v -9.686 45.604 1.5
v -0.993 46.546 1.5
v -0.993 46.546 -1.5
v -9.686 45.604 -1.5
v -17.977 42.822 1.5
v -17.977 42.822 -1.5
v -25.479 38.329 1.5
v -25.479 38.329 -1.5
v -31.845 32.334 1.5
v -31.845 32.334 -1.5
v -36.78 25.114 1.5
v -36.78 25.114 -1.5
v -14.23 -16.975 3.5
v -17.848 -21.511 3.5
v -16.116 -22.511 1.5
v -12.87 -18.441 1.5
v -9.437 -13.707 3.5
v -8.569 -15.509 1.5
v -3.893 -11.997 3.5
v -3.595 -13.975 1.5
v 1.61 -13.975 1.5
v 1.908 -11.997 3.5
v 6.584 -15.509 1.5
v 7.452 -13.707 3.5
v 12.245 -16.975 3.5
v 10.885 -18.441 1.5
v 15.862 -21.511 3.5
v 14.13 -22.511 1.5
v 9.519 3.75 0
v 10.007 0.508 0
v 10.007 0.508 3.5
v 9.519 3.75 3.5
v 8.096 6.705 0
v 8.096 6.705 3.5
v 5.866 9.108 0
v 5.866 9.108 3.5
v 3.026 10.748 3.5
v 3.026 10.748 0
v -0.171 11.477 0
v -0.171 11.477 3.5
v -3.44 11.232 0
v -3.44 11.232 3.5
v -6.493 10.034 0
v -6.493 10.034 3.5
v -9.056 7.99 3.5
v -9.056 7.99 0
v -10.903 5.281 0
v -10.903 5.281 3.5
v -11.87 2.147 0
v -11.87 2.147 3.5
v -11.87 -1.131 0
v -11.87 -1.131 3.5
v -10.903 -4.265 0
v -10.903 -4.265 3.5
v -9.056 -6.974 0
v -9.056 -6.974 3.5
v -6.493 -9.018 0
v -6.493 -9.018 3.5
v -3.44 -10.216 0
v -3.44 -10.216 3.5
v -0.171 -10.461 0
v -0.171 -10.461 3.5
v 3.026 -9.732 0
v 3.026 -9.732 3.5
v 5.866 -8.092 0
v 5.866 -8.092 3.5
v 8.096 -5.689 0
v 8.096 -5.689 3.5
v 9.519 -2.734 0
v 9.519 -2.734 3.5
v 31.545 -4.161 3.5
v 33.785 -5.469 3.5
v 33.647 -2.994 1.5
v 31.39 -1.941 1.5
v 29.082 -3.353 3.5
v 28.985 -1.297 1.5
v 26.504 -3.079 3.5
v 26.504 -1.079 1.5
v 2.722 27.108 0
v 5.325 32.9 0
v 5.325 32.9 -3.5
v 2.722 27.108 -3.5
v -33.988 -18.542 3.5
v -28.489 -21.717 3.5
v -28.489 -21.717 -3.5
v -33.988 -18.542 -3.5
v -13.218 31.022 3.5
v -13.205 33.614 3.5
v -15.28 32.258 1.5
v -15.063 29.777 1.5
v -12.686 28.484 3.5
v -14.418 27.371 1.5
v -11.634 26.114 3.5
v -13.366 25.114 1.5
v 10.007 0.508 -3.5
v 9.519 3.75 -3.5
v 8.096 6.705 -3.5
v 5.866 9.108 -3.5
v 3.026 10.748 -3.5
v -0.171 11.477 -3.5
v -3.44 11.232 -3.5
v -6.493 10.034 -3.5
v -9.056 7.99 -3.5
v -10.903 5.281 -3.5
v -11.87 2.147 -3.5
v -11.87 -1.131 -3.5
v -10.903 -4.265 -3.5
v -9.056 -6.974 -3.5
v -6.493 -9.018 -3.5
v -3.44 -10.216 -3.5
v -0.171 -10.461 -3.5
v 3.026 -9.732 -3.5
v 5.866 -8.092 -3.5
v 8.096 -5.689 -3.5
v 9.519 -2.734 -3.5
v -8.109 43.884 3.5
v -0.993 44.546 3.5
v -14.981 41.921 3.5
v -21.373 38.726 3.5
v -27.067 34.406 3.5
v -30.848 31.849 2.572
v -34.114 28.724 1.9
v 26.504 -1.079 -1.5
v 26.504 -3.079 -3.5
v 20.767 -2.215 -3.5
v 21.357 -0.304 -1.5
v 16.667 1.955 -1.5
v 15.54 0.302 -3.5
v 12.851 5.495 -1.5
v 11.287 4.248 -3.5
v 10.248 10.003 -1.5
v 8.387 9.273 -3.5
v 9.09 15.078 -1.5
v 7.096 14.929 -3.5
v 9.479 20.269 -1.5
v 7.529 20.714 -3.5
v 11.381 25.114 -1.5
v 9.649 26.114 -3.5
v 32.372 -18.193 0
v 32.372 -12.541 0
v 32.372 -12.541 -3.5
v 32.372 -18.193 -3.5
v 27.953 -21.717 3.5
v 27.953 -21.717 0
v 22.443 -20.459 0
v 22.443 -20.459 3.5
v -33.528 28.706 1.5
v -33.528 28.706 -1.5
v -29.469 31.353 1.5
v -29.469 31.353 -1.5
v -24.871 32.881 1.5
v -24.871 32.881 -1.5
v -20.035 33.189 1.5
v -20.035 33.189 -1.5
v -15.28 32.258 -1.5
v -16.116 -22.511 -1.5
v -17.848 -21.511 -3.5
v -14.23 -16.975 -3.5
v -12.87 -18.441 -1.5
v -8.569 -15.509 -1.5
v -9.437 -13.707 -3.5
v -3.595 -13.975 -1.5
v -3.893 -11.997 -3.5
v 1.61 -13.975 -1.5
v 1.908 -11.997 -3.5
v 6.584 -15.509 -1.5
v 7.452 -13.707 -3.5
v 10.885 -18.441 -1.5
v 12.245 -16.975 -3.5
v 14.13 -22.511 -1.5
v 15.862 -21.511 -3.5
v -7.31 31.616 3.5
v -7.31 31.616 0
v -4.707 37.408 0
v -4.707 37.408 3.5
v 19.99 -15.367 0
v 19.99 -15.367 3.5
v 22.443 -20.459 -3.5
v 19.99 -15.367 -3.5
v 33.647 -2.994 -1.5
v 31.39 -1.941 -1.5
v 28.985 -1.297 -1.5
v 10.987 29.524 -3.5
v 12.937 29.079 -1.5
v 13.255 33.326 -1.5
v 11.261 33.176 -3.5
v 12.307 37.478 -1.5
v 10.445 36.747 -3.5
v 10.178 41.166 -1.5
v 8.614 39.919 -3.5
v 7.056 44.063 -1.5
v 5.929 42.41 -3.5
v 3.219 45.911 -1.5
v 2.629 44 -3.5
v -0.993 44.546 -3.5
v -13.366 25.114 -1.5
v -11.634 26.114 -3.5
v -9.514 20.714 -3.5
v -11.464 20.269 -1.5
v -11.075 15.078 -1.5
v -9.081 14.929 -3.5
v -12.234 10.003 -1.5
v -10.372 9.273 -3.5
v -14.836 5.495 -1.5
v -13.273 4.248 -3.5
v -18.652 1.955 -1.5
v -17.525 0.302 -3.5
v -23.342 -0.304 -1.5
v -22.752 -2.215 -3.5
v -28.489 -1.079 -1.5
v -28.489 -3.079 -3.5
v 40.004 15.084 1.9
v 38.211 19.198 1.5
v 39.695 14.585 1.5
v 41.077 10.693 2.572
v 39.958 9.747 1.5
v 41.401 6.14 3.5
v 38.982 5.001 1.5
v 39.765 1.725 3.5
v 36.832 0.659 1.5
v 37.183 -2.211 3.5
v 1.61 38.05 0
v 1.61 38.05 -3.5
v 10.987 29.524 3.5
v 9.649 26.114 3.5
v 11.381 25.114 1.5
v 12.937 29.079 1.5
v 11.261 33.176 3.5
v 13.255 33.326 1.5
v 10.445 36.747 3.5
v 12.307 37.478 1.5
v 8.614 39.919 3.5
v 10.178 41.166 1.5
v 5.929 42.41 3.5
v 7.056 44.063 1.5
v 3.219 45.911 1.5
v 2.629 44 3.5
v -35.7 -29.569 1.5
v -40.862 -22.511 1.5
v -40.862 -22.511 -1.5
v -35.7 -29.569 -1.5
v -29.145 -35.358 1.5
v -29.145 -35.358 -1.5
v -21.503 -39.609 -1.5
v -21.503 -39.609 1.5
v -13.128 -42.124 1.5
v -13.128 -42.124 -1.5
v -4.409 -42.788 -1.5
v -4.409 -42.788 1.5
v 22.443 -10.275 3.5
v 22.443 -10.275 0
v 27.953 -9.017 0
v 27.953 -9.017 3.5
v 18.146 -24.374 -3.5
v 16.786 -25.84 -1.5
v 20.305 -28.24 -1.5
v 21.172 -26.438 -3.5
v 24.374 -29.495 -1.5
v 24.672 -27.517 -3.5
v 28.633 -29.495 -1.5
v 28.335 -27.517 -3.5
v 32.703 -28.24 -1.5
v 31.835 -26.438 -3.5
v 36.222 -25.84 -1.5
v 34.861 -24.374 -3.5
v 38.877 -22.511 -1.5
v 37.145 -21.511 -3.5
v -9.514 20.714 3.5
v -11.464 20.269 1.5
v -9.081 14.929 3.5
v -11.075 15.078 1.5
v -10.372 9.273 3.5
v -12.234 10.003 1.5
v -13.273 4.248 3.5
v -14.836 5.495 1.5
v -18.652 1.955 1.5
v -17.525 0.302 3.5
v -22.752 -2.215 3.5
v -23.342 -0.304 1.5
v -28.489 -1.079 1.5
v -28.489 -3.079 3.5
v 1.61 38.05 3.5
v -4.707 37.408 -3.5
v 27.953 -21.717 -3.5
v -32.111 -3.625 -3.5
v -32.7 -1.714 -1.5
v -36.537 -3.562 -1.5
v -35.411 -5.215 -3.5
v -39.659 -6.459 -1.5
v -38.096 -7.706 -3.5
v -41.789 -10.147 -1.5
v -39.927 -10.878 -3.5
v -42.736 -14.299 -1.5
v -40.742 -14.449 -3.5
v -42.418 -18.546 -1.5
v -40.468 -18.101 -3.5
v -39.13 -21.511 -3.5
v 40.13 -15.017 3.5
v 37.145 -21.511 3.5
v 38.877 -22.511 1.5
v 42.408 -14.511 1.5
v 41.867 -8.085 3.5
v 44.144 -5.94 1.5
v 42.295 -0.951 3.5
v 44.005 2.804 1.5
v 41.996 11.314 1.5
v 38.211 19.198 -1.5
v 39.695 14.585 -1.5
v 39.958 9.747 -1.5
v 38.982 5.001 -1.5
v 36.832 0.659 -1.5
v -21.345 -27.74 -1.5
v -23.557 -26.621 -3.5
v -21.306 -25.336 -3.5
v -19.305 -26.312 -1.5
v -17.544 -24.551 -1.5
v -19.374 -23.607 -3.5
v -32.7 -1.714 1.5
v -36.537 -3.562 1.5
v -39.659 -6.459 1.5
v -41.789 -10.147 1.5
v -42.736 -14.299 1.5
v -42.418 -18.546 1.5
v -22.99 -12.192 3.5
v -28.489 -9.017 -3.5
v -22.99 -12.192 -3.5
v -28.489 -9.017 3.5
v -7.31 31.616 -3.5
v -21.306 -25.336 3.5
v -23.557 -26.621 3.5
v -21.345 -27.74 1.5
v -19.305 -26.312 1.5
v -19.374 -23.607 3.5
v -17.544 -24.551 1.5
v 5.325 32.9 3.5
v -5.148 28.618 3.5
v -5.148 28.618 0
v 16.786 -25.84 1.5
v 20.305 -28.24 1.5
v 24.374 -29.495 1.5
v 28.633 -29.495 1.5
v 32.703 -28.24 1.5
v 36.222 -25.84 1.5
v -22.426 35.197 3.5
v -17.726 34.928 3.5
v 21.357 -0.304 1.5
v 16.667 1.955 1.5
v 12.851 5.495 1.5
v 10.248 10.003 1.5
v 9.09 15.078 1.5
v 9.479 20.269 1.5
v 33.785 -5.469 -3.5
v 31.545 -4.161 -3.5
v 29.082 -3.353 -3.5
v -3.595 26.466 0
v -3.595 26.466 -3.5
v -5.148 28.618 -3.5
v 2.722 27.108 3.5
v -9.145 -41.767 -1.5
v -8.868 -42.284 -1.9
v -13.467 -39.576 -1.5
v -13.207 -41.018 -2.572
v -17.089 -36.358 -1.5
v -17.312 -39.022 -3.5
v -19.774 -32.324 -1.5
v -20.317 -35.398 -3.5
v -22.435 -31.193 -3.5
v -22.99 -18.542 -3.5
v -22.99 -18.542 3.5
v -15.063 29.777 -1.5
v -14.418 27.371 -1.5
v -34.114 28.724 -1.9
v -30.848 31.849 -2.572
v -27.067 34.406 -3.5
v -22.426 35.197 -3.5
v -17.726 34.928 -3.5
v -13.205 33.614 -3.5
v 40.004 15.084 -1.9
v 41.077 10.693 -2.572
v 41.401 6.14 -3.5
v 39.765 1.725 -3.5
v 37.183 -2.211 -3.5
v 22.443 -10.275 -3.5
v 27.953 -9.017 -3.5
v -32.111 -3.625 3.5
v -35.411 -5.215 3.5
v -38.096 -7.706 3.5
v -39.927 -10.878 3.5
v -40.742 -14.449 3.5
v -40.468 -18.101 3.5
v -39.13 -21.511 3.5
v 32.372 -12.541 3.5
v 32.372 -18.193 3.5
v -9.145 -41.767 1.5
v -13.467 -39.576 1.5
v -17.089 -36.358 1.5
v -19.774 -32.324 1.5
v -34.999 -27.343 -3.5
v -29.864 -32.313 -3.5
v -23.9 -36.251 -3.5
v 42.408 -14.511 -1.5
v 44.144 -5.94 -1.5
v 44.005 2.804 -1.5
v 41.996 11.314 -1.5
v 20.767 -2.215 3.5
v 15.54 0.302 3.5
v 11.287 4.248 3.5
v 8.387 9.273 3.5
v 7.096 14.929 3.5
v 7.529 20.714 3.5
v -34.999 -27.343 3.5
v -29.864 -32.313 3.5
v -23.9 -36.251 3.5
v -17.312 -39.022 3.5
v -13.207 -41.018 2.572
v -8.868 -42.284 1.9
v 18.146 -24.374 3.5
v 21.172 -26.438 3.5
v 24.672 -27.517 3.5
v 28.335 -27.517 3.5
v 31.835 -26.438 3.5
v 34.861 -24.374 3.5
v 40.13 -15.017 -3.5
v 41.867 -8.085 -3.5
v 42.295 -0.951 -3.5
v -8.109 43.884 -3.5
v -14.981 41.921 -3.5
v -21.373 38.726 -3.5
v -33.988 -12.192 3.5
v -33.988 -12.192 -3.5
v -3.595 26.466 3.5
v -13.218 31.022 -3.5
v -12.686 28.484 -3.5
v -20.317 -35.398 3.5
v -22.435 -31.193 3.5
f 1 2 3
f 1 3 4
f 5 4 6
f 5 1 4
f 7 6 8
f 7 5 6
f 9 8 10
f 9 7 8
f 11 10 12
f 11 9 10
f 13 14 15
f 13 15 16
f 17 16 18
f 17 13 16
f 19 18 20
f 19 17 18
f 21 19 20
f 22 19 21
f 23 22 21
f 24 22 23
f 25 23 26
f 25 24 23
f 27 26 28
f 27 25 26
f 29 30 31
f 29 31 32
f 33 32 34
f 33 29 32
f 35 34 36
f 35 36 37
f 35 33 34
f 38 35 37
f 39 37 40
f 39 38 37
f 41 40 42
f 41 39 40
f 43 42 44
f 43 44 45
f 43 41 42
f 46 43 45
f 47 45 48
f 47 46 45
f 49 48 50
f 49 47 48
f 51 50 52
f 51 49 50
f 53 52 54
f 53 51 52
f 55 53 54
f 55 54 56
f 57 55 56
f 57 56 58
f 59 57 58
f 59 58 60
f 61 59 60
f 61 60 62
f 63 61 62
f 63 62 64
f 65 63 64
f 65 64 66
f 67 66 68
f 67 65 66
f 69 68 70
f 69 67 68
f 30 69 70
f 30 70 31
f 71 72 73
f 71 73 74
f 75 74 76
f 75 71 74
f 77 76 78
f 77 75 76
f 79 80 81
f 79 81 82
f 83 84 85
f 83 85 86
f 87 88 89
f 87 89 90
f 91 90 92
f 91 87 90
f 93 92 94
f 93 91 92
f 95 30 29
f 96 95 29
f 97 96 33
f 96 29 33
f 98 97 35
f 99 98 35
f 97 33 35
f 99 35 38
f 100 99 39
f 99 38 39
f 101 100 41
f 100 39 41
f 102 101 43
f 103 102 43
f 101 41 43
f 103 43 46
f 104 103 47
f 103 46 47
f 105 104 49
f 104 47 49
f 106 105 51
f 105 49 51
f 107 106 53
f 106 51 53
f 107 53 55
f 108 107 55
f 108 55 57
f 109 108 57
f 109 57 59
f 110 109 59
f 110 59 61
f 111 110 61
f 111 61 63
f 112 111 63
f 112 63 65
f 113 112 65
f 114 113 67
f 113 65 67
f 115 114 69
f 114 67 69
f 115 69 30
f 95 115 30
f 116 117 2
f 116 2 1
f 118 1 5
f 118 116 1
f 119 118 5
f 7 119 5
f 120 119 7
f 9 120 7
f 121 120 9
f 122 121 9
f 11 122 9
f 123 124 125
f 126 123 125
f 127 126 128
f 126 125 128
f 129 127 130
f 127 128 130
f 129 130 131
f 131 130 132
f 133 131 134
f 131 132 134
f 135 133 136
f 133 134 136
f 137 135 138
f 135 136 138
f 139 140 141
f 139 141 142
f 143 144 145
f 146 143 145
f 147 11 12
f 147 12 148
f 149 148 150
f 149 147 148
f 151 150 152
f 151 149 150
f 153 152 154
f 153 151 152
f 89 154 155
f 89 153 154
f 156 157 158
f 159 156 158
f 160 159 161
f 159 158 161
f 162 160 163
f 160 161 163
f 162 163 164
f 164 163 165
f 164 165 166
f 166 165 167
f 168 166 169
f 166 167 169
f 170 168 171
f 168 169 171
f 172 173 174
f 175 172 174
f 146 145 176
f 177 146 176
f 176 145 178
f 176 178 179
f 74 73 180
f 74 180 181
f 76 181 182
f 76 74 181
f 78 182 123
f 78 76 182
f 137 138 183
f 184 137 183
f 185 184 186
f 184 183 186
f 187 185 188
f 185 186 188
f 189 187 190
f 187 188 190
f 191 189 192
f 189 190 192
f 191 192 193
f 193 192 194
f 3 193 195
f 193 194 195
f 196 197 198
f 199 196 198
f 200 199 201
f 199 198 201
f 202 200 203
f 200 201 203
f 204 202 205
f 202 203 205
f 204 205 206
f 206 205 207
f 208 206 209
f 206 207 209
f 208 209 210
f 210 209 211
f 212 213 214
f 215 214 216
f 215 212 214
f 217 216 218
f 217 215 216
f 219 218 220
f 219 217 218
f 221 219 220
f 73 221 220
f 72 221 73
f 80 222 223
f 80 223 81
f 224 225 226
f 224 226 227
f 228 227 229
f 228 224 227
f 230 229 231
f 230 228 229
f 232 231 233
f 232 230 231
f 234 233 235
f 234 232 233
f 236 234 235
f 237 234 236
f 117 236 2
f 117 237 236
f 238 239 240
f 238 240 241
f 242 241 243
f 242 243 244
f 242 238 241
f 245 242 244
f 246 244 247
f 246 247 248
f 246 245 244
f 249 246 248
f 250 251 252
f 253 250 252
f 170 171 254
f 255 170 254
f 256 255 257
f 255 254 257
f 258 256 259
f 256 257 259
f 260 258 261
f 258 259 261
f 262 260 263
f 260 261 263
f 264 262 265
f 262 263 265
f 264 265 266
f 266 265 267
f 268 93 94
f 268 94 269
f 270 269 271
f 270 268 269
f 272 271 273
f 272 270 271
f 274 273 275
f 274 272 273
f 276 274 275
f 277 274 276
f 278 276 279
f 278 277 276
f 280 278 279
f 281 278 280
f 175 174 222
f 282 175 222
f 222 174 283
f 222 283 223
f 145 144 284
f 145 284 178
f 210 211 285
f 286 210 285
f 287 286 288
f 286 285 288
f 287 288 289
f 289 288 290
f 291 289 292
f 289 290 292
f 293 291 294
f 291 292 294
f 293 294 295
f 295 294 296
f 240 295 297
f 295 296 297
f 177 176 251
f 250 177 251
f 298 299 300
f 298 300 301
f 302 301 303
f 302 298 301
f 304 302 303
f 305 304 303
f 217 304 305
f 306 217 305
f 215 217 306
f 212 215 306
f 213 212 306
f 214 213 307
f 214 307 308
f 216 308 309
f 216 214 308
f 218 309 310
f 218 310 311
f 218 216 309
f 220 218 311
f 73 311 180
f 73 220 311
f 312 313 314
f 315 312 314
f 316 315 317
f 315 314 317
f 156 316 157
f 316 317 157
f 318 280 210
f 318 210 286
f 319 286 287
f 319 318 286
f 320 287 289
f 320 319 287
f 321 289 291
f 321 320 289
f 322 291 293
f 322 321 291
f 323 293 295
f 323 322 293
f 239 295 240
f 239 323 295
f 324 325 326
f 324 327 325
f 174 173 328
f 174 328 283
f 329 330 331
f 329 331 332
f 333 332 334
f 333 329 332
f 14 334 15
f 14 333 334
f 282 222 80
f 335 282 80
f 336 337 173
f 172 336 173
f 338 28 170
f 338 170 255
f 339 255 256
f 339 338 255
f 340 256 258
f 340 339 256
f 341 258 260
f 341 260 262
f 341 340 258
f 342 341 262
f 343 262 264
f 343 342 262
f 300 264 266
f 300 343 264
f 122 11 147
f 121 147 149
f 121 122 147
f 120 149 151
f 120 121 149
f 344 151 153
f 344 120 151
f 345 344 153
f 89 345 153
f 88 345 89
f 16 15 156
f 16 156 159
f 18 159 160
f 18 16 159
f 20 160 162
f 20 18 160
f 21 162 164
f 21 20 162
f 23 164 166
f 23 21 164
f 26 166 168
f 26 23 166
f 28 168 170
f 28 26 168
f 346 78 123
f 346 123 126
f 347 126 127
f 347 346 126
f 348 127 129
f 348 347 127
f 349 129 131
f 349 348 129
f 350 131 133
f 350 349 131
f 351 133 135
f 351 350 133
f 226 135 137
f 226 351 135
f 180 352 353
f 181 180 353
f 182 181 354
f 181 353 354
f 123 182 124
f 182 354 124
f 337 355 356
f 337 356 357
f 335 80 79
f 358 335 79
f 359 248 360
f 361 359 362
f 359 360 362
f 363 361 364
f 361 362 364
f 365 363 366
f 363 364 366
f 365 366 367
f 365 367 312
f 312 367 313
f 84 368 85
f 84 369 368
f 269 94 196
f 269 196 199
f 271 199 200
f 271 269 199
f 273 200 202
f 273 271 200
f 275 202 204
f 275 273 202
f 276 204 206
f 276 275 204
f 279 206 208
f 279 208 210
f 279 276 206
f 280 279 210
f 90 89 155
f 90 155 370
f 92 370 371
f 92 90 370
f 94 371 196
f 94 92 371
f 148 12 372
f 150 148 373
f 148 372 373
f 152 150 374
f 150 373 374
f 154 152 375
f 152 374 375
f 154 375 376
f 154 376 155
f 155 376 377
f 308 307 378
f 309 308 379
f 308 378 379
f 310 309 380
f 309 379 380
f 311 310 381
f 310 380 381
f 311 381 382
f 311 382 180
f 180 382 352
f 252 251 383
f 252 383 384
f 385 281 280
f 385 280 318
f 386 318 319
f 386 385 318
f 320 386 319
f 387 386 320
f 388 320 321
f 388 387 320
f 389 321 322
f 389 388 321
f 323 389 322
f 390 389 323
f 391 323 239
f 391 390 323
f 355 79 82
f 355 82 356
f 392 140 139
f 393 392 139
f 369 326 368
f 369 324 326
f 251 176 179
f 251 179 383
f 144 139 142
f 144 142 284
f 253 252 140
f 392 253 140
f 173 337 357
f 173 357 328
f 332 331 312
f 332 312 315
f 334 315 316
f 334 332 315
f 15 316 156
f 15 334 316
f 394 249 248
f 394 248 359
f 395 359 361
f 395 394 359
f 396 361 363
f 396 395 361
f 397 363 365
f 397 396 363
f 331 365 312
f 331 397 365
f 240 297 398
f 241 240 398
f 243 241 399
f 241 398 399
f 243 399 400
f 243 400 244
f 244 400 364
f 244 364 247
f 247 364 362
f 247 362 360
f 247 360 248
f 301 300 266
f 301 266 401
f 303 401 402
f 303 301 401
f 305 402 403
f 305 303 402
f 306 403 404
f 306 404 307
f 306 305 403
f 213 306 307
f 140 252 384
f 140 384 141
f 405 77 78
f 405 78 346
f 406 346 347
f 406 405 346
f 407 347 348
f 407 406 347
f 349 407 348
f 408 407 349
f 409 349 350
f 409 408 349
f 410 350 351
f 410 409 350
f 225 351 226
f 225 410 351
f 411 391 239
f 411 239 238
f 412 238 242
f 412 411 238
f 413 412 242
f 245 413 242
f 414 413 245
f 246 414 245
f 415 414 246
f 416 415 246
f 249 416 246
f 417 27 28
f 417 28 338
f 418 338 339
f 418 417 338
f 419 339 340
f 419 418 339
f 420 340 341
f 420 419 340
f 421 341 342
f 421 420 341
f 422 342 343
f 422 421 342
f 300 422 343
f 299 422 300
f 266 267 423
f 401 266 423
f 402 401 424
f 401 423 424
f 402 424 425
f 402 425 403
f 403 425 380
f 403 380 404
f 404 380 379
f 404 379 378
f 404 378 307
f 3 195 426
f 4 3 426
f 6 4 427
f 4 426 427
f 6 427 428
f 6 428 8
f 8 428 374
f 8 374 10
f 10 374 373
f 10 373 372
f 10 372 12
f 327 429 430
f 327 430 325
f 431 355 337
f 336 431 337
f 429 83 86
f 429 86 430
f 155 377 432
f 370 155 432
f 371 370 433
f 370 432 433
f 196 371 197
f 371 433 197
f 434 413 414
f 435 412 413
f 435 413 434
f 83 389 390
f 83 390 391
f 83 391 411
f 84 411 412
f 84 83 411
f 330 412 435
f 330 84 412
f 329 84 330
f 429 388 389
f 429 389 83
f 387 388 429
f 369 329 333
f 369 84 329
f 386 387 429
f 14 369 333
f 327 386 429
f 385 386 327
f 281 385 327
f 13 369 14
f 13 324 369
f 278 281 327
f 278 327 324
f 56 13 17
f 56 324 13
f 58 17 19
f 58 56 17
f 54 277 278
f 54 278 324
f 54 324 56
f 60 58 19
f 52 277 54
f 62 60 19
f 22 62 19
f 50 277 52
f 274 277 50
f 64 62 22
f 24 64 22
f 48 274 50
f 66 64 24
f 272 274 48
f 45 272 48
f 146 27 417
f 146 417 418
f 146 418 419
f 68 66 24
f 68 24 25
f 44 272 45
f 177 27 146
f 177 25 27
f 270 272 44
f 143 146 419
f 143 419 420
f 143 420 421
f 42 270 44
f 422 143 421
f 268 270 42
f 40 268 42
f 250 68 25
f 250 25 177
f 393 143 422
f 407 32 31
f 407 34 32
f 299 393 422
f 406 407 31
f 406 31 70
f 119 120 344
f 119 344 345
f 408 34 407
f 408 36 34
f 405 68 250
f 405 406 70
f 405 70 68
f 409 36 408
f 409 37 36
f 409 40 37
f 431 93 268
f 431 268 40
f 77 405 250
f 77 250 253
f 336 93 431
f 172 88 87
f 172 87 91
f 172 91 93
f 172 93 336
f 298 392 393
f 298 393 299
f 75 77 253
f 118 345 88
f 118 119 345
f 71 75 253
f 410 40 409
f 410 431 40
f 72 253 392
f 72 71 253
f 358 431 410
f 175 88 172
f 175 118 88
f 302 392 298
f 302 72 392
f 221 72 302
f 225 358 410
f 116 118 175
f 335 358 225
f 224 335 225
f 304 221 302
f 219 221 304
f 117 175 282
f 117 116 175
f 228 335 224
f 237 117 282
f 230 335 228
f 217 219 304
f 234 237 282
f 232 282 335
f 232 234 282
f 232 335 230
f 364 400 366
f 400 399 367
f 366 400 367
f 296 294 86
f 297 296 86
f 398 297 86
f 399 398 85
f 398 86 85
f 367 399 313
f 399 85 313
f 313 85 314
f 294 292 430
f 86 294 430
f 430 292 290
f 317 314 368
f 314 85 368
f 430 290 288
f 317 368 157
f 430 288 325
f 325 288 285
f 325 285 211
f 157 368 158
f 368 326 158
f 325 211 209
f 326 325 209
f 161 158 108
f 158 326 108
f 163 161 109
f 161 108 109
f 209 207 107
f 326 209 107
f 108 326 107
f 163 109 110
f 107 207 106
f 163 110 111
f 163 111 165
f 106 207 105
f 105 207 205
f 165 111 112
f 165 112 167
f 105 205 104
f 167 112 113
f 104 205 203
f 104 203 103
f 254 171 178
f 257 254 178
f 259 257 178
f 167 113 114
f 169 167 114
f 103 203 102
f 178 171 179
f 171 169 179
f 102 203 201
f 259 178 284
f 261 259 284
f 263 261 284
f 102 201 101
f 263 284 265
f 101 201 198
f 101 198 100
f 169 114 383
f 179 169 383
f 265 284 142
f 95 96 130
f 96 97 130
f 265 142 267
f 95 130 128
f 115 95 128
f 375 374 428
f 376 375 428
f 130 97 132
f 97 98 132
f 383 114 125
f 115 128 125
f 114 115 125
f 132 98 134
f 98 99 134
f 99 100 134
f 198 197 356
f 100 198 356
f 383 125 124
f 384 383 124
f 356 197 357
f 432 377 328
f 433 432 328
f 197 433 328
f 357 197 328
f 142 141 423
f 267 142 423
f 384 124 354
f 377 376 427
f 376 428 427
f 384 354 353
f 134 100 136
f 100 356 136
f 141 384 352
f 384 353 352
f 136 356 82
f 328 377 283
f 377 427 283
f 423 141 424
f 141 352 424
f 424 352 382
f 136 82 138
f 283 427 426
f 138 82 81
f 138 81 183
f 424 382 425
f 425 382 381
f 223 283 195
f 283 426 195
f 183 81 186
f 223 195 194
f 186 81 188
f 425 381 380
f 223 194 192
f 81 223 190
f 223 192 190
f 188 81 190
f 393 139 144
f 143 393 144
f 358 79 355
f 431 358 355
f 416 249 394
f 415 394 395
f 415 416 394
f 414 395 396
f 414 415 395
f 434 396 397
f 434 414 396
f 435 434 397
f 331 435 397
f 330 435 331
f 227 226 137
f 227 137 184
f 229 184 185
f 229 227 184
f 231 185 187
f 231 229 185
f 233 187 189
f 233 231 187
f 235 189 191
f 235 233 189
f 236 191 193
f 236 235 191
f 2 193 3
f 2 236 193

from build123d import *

# Parameters (mm, degrees)
F0_R          = 11
F1_DEPTH      = 3.5
F1_DEPTH_BACK = 3.5
F2_SIZE       = 2


# Not quite as in the source:
# - a feature names something its author has since deleted; it is built from what else it names


with BuildPart() as f1:
    # F0 (on Top) → F1 (new body, two sides)
    with BuildSketch(Plane.XY) as f1_sk:
        with BuildLine():
            ThreePointArc((-36.7798490863, 25.1142671396), (-27.219118588, 32.264950132), (-15.2801158302, 32.2580171396))
            ThreePointArc((-15.2801158302, 32.2580171396), (-14.7932810733, 28.5601400327), (-13.3659537868, 25.1142671396))
            ThreePointArc((-13.3659537868, 25.1142671396), (-13.3659537868, 7.6517671396), (-28.4889224003, -1.0794828604))
            ThreePointArc((-28.4889224003, -1.0794828604), (-40.8622603569, -8.2232328604), (-40.8622603569, -22.5107328604))
            ThreePointArc((-40.8622603569, -22.5107328604), (-25.4390445698, -37.6894940637), (-4.408636794, -42.7877609913))
            ThreePointArc((-4.408636794, -42.7877609913), (-15.3816751689, -38.0832669973), (-21.3451724003, -27.740320817))
            ThreePointArc((-21.3451724003, -27.740320817), (-18.3861342641, -25.4697709966), (-16.1155844438, -22.5107328604))
            ThreePointArc((-16.1155844438, -22.5107328604), (-0.9926158302, -13.7794828604), (14.1303527834, -22.5107328604))
            ThreePointArc((14.1303527834, -22.5107328604), (26.50369074, -29.6544828604), (38.8770286965, -22.5107328604))
            ThreePointArc((38.8770286965, -22.5107328604), (44.310613603, -1.5644555791), (38.2106383897, 19.1975452705))
            ThreePointArc((38.2106383897, 19.1975452705), (39.6229462664, 7.3423682841), (33.64744074, -2.9936449038))
            ThreePointArc((33.64744074, -2.9936449038), (30.2015678469, -1.5663176173), (26.50369074, -1.0794828604))
            ThreePointArc((26.50369074, -1.0794828604), (11.3807221264, 7.6517671396), (11.3807221264, 25.1142671396))
            ThreePointArc((11.3807221264, 25.1142671396), (11.3807221264, 39.4017671396), (-0.9926158302, 46.5455171396))
            ThreePointArc((-0.9926158302, 46.5455171396), (-21.8494165238, 40.7780010616), (-36.7798490863, 25.1142671396))
        make_face()
        Polygon((-28.4889224003, -21.7169828604), (-33.9881837144, -18.5419828604), (-33.9881837144, -12.1919828604), (-28.4889224003, -9.0169828604), (-22.9896610863, -12.1919828604), (-22.9896610863, -18.5419828604), align=None, mode=Mode.SUBTRACT)
        with Locations((-0.9926158302, 0.5080171396)):
            Circle(F0_R, mode=Mode.SUBTRACT)
        Polygon((27.9530368024, -9.0169828604), (32.3719731429, -12.5409669992), (32.3719731429, -18.1929987216), (27.9530368024, -21.7169828604), (22.4427133156, -20.4592874828), (19.9903886582, -15.3669828604), (22.4427133156, -10.274678238), align=None, mode=Mode.SUBTRACT)
        Polygon((5.3248489637, 32.8999973403), (2.7220877293, 27.1079222409), (-3.5953770646, 26.4659420402), (-5.1476309604, 28.6179993288), (-7.3100806241, 31.6160369389), (-4.7073193896, 37.4081120383), (1.6101454042, 38.050092239), align=None, mode=Mode.SUBTRACT)
    extrude(amount=F1_DEPTH)
    extrude(f1_sk.sketch, amount=-F1_DEPTH_BACK)

    # F2
    f2_edges = [f1.edges().sort_by_distance(p)[0] for p in [
        (-25.439045, -37.689494, 3.5),
        (-25.439045, -37.689494, -3.5),
        (-21.849417, 40.778001, -3.5),
        (-21.849417, 40.778001, 3.5),
        (26.503691, -29.654483, -3.5),
        (26.503691, -29.654483, 3.5),
        (-27.219119, 32.26495, 3.5),
        (39.622946, 7.342368, -3.5),
        (39.622946, 7.342368, 3.5),
        (-27.219119, 32.26495, -3.5),
        (-15.381675, -38.083267, -3.5),
        (-15.381675, -38.083267, 3.5),
    ]]
    chamfer(f2_edges, length=F2_SIZE)


solid = f1.part
